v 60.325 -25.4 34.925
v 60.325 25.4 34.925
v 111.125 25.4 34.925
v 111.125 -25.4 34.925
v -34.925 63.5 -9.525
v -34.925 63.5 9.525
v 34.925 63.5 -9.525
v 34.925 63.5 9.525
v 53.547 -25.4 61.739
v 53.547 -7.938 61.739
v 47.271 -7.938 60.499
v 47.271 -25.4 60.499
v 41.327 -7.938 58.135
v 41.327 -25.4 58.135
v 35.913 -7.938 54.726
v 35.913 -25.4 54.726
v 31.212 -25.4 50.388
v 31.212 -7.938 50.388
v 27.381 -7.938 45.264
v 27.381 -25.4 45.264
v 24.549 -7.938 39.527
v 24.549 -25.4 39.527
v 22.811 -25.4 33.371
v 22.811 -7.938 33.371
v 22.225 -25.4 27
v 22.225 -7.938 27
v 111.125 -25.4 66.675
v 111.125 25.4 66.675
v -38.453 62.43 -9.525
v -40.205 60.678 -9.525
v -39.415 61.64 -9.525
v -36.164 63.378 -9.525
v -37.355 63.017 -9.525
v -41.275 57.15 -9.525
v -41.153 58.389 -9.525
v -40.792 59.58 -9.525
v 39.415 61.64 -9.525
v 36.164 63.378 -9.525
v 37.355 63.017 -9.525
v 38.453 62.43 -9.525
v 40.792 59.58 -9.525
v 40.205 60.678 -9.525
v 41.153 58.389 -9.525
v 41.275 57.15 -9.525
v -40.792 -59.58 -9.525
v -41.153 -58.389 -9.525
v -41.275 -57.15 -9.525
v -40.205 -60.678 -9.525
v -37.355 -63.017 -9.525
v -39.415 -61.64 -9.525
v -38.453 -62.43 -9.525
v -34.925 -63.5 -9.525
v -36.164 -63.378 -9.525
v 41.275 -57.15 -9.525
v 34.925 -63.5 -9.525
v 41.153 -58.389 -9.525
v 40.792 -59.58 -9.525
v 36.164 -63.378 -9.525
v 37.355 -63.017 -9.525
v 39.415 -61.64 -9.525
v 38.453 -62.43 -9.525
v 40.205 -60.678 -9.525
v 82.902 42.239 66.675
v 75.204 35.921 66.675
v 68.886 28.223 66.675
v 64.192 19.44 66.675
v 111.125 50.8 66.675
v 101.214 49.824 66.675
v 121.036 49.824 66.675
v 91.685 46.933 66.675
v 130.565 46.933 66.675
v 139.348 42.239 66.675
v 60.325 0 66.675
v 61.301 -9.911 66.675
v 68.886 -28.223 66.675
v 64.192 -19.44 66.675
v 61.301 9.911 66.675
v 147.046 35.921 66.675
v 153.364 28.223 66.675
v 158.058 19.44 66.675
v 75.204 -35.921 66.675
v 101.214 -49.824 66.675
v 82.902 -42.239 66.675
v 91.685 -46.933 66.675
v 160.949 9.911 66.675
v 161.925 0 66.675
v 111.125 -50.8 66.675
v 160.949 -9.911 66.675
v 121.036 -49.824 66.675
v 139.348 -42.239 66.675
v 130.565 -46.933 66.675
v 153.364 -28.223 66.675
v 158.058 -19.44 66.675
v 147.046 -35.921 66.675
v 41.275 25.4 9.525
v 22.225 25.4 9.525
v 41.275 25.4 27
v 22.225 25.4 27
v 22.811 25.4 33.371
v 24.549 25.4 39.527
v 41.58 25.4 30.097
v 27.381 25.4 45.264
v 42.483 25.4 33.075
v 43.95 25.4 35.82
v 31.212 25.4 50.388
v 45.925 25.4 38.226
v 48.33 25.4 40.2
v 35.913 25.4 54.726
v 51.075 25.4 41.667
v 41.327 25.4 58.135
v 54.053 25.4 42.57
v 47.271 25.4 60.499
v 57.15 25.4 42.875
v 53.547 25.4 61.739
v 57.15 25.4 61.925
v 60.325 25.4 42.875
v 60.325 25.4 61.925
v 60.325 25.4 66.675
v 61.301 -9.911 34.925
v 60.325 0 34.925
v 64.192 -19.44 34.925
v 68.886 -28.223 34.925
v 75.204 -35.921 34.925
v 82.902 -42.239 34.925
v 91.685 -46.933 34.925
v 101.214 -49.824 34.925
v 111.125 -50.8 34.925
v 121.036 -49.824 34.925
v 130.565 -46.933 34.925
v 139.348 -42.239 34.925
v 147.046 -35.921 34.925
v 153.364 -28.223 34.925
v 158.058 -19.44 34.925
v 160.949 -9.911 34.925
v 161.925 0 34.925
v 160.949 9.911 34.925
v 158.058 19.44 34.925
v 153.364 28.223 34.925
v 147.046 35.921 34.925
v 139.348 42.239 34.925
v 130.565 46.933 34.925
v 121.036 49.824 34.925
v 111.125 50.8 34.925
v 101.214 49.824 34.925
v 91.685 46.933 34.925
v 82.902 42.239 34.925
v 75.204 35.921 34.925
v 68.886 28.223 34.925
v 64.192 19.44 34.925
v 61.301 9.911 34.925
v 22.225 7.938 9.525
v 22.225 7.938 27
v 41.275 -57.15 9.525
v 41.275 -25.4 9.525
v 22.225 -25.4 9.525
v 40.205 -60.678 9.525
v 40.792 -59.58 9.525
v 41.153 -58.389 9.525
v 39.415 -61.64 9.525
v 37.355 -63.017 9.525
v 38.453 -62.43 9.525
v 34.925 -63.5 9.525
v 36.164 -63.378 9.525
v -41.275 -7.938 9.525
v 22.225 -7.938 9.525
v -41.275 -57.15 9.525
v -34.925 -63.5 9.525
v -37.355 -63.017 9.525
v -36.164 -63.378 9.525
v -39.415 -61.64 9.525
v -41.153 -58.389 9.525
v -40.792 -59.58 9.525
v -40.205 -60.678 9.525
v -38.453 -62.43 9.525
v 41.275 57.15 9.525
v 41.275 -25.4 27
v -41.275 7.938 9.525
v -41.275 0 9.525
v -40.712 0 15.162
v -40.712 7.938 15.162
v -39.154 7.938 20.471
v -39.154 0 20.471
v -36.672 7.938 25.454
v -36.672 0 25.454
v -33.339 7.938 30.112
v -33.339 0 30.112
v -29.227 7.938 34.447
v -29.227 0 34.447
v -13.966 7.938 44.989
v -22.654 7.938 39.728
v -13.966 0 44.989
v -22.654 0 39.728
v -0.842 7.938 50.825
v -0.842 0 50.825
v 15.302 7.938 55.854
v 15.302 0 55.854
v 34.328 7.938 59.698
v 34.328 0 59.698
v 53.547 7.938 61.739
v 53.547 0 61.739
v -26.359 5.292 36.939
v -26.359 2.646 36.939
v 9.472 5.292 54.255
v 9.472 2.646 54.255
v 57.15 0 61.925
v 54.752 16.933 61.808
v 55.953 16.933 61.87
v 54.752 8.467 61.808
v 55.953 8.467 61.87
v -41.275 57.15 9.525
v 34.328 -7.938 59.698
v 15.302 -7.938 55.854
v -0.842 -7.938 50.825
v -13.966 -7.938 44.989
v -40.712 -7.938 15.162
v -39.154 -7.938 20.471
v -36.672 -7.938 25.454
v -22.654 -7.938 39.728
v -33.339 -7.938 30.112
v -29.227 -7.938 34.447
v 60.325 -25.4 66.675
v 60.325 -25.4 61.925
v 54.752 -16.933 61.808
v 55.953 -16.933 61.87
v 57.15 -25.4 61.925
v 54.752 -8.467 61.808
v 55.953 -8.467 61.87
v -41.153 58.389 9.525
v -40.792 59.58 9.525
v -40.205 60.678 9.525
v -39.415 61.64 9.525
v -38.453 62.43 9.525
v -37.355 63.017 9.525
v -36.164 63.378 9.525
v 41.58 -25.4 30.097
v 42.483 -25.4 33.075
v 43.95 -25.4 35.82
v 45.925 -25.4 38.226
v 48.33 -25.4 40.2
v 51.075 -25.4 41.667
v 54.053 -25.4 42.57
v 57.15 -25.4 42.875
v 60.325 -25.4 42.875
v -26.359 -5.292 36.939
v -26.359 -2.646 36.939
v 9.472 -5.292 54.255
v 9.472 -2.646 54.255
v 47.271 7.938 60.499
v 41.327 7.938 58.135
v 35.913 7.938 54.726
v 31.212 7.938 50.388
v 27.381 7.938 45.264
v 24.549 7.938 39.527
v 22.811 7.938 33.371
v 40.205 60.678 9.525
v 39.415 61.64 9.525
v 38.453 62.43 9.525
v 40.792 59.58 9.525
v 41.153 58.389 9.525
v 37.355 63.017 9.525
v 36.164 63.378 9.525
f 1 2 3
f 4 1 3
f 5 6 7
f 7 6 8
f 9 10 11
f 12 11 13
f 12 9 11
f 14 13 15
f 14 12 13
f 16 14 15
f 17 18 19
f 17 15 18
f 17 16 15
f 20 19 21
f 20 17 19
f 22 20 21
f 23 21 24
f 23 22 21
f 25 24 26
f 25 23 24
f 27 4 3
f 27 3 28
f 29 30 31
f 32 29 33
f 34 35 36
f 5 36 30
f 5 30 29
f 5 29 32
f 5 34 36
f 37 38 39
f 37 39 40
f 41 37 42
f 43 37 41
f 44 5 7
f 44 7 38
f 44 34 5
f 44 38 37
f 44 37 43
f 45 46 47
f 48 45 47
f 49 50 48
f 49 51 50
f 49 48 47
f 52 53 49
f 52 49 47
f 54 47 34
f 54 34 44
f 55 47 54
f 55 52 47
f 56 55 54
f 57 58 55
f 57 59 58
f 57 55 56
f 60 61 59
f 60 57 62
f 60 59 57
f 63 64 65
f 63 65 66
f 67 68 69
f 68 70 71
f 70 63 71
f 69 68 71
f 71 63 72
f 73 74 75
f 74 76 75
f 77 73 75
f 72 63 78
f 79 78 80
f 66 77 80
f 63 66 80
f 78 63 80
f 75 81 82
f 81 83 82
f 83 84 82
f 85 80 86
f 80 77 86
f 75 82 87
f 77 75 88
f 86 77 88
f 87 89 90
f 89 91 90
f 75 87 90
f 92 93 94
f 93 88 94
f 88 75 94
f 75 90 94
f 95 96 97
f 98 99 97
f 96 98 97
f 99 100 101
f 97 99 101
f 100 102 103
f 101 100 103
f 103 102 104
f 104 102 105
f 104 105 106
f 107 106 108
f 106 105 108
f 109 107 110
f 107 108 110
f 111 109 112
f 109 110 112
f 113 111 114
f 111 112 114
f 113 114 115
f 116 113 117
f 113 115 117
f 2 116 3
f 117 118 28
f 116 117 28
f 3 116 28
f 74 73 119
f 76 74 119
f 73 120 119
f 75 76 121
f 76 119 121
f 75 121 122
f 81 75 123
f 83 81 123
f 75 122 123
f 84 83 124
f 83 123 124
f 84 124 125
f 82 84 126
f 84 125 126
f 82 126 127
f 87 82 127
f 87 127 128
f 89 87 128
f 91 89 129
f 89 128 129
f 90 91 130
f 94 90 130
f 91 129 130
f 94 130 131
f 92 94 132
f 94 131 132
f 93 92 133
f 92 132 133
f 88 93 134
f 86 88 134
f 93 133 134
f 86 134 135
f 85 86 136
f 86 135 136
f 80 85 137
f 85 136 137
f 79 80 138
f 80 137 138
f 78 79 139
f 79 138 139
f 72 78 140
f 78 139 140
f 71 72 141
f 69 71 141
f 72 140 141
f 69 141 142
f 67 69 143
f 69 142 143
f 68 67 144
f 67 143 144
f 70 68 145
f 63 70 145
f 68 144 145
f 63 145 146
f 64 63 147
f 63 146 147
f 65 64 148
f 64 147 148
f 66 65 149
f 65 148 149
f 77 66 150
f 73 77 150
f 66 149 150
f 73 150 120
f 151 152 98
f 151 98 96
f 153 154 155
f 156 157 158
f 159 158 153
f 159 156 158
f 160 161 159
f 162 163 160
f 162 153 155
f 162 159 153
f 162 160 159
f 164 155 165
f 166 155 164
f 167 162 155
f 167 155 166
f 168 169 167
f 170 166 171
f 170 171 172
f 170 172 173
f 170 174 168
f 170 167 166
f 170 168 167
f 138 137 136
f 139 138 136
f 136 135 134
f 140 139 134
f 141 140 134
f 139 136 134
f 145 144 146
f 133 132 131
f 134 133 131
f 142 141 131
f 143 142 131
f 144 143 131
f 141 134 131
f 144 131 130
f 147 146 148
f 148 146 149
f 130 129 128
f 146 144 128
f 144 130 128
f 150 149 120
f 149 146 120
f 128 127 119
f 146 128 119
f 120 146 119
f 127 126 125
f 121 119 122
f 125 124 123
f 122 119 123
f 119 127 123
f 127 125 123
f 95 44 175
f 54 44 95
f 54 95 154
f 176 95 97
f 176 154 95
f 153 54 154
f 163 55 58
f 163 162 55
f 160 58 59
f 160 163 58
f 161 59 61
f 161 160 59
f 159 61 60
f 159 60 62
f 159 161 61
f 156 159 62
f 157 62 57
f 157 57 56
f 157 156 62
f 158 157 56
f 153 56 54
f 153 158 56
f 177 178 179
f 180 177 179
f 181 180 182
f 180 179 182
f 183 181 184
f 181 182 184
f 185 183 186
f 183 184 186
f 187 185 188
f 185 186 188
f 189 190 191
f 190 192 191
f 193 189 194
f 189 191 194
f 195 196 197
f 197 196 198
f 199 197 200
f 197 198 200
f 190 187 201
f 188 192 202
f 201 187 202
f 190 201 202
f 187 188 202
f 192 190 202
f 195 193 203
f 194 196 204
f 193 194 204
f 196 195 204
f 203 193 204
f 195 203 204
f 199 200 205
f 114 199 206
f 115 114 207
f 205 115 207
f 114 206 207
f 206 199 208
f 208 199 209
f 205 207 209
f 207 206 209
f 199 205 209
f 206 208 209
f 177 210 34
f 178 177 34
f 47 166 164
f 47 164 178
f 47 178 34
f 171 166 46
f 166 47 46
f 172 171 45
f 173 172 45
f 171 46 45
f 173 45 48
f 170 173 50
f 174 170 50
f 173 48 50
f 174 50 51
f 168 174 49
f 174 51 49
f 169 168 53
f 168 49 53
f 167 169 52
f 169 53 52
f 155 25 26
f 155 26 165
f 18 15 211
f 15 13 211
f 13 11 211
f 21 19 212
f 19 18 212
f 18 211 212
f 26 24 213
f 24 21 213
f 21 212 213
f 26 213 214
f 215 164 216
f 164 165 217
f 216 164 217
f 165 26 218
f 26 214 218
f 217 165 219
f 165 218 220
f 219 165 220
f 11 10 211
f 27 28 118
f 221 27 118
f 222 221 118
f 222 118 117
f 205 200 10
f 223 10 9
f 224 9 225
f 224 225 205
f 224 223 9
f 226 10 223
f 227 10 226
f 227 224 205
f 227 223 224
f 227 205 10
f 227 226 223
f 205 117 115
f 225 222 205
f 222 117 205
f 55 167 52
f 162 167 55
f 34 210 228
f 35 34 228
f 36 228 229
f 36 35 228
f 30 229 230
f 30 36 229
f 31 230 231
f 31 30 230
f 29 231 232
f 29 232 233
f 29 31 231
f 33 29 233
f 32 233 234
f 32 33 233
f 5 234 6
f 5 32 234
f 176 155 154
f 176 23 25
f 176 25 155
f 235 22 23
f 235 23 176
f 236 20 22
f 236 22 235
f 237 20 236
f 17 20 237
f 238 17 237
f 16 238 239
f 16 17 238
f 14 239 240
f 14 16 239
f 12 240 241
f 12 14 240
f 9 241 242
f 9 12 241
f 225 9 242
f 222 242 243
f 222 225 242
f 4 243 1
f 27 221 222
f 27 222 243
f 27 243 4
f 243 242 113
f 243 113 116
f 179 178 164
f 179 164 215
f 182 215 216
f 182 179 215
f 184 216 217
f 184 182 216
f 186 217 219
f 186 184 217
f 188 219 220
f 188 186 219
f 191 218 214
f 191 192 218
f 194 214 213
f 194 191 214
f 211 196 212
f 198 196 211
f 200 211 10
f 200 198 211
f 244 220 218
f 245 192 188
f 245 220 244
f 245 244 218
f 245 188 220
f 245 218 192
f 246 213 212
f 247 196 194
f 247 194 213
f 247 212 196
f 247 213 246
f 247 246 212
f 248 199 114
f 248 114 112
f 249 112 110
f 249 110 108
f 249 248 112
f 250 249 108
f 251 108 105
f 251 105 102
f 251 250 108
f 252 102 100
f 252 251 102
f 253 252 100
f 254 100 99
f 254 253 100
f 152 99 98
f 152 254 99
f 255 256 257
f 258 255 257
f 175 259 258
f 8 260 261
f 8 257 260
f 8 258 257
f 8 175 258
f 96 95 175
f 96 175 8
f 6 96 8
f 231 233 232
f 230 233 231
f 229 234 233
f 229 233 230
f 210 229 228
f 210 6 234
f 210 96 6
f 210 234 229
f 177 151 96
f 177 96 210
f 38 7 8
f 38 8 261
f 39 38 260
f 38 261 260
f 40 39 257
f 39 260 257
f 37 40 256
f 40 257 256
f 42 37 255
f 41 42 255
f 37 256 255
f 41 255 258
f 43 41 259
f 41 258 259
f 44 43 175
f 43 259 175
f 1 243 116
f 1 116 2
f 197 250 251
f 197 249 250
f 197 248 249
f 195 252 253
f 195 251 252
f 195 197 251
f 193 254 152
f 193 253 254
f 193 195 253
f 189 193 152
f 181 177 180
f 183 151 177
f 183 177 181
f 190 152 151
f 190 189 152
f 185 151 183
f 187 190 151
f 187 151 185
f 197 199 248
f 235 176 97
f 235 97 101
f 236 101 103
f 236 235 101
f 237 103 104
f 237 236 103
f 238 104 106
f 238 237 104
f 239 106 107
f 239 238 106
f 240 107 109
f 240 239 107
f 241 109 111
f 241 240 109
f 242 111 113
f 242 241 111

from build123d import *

# Parameters (mm, degrees)
F1_DEPTH = 63.5
F2_DEPTH = 25.4
F3_DEPTH = 7.9375
F5_R     = 6.35


with BuildPart() as f1:
    # F0 (on Front) → F1 (new body, symmetric)
    with BuildSketch(Plane.XZ):
        Polygon((-41.275, 9.525), (-41.275, -9.525), (41.275, -9.525), (41.275, 9.525), (22.225, 9.525), align=None)
    extrude(amount=F1_DEPTH, both=True)

    # F0 (on Front) → F2 (join, symmetric)
    with BuildSketch(Plane.XZ):
        with BuildLine():
            Line((22.225, 9.525), (41.275, 9.525))
            Line((41.275, 9.525), (41.275, 27.0002))
            ThreePointArc((41.275, 27.0002), (45.92468, 38.22552), (57.15, 42.8752))
            Line((57.15, 42.8752), (60.325, 42.8752))
            Line((60.325, 42.8752), (60.325, 61.9252))
            Line((60.325, 61.9252), (57.15, 61.9252))
            add(Edge.make_bspline(
                [(53.547482, 61.738903), (54.753709, 61.811789), (55.954941, 61.87388), (57.15, 61.9252)],
                knots=[108.527599, 108.527599, 108.527599, 108.527599, 111.504536, 111.504536, 111.504536, 111.504536], degree=3))
            ThreePointArc((53.547482, 61.738903), (31.211866, 50.387565), (22.225, 27.0002))
            Line((22.225, 27.0002), (22.225, 9.525))
        make_face()
        Polygon((60.325, 66.675), (60.325, 61.9252), (60.325, 42.8752), (60.325, 34.925), (111.125, 34.925), (111.125, 66.675), align=None)
    extrude(amount=F2_DEPTH, both=True)

    # F0 (on Front) → F3 (join, symmetric)
    with BuildSketch(Plane.XZ):
        with BuildLine():
            add(Edge.make_bspline(
                [(-41.275, 9.525), (-41.040701, 42.076949), (9.573105, 59.081756), (53.547482, 61.738903)],
                knots=[0, 0, 0, 0, 108.527599, 108.527599, 108.527599, 108.527599], degree=3))
            Line((-41.275, 9.525), (22.225, 9.525))
            Line((22.225, 9.525), (22.225, 27.0002))
            ThreePointArc((22.225, 27.0002), (31.211866, 50.387565), (53.547482, 61.738903))
        make_face()
    extrude(amount=F3_DEPTH, both=True)

    # F5
    f5_edges = [f1.edges().sort_by_distance(p)[0] for p in [
        (41.275, -63.5, 0),
        (-41.275, -63.5, 0),
        (41.275, 63.5, 0),
        (-41.275, 63.5, 0),
    ]]
    fillet(f5_edges, radius=F5_R)


with BuildPart() as f4:
    # F0 (on Front) → F4 (revolve)
    with BuildSketch(Plane.XZ):
        Polygon((60.325, 66.675), (60.325, 61.9252), (60.325, 42.8752), (60.325, 34.925), (111.125, 34.925), (111.125, 66.675), align=None)
    revolve(axis=Axis((111.125, 0, 50.8), (0, 0, 1)))


solid = Compound([f1.part, f4.part])
